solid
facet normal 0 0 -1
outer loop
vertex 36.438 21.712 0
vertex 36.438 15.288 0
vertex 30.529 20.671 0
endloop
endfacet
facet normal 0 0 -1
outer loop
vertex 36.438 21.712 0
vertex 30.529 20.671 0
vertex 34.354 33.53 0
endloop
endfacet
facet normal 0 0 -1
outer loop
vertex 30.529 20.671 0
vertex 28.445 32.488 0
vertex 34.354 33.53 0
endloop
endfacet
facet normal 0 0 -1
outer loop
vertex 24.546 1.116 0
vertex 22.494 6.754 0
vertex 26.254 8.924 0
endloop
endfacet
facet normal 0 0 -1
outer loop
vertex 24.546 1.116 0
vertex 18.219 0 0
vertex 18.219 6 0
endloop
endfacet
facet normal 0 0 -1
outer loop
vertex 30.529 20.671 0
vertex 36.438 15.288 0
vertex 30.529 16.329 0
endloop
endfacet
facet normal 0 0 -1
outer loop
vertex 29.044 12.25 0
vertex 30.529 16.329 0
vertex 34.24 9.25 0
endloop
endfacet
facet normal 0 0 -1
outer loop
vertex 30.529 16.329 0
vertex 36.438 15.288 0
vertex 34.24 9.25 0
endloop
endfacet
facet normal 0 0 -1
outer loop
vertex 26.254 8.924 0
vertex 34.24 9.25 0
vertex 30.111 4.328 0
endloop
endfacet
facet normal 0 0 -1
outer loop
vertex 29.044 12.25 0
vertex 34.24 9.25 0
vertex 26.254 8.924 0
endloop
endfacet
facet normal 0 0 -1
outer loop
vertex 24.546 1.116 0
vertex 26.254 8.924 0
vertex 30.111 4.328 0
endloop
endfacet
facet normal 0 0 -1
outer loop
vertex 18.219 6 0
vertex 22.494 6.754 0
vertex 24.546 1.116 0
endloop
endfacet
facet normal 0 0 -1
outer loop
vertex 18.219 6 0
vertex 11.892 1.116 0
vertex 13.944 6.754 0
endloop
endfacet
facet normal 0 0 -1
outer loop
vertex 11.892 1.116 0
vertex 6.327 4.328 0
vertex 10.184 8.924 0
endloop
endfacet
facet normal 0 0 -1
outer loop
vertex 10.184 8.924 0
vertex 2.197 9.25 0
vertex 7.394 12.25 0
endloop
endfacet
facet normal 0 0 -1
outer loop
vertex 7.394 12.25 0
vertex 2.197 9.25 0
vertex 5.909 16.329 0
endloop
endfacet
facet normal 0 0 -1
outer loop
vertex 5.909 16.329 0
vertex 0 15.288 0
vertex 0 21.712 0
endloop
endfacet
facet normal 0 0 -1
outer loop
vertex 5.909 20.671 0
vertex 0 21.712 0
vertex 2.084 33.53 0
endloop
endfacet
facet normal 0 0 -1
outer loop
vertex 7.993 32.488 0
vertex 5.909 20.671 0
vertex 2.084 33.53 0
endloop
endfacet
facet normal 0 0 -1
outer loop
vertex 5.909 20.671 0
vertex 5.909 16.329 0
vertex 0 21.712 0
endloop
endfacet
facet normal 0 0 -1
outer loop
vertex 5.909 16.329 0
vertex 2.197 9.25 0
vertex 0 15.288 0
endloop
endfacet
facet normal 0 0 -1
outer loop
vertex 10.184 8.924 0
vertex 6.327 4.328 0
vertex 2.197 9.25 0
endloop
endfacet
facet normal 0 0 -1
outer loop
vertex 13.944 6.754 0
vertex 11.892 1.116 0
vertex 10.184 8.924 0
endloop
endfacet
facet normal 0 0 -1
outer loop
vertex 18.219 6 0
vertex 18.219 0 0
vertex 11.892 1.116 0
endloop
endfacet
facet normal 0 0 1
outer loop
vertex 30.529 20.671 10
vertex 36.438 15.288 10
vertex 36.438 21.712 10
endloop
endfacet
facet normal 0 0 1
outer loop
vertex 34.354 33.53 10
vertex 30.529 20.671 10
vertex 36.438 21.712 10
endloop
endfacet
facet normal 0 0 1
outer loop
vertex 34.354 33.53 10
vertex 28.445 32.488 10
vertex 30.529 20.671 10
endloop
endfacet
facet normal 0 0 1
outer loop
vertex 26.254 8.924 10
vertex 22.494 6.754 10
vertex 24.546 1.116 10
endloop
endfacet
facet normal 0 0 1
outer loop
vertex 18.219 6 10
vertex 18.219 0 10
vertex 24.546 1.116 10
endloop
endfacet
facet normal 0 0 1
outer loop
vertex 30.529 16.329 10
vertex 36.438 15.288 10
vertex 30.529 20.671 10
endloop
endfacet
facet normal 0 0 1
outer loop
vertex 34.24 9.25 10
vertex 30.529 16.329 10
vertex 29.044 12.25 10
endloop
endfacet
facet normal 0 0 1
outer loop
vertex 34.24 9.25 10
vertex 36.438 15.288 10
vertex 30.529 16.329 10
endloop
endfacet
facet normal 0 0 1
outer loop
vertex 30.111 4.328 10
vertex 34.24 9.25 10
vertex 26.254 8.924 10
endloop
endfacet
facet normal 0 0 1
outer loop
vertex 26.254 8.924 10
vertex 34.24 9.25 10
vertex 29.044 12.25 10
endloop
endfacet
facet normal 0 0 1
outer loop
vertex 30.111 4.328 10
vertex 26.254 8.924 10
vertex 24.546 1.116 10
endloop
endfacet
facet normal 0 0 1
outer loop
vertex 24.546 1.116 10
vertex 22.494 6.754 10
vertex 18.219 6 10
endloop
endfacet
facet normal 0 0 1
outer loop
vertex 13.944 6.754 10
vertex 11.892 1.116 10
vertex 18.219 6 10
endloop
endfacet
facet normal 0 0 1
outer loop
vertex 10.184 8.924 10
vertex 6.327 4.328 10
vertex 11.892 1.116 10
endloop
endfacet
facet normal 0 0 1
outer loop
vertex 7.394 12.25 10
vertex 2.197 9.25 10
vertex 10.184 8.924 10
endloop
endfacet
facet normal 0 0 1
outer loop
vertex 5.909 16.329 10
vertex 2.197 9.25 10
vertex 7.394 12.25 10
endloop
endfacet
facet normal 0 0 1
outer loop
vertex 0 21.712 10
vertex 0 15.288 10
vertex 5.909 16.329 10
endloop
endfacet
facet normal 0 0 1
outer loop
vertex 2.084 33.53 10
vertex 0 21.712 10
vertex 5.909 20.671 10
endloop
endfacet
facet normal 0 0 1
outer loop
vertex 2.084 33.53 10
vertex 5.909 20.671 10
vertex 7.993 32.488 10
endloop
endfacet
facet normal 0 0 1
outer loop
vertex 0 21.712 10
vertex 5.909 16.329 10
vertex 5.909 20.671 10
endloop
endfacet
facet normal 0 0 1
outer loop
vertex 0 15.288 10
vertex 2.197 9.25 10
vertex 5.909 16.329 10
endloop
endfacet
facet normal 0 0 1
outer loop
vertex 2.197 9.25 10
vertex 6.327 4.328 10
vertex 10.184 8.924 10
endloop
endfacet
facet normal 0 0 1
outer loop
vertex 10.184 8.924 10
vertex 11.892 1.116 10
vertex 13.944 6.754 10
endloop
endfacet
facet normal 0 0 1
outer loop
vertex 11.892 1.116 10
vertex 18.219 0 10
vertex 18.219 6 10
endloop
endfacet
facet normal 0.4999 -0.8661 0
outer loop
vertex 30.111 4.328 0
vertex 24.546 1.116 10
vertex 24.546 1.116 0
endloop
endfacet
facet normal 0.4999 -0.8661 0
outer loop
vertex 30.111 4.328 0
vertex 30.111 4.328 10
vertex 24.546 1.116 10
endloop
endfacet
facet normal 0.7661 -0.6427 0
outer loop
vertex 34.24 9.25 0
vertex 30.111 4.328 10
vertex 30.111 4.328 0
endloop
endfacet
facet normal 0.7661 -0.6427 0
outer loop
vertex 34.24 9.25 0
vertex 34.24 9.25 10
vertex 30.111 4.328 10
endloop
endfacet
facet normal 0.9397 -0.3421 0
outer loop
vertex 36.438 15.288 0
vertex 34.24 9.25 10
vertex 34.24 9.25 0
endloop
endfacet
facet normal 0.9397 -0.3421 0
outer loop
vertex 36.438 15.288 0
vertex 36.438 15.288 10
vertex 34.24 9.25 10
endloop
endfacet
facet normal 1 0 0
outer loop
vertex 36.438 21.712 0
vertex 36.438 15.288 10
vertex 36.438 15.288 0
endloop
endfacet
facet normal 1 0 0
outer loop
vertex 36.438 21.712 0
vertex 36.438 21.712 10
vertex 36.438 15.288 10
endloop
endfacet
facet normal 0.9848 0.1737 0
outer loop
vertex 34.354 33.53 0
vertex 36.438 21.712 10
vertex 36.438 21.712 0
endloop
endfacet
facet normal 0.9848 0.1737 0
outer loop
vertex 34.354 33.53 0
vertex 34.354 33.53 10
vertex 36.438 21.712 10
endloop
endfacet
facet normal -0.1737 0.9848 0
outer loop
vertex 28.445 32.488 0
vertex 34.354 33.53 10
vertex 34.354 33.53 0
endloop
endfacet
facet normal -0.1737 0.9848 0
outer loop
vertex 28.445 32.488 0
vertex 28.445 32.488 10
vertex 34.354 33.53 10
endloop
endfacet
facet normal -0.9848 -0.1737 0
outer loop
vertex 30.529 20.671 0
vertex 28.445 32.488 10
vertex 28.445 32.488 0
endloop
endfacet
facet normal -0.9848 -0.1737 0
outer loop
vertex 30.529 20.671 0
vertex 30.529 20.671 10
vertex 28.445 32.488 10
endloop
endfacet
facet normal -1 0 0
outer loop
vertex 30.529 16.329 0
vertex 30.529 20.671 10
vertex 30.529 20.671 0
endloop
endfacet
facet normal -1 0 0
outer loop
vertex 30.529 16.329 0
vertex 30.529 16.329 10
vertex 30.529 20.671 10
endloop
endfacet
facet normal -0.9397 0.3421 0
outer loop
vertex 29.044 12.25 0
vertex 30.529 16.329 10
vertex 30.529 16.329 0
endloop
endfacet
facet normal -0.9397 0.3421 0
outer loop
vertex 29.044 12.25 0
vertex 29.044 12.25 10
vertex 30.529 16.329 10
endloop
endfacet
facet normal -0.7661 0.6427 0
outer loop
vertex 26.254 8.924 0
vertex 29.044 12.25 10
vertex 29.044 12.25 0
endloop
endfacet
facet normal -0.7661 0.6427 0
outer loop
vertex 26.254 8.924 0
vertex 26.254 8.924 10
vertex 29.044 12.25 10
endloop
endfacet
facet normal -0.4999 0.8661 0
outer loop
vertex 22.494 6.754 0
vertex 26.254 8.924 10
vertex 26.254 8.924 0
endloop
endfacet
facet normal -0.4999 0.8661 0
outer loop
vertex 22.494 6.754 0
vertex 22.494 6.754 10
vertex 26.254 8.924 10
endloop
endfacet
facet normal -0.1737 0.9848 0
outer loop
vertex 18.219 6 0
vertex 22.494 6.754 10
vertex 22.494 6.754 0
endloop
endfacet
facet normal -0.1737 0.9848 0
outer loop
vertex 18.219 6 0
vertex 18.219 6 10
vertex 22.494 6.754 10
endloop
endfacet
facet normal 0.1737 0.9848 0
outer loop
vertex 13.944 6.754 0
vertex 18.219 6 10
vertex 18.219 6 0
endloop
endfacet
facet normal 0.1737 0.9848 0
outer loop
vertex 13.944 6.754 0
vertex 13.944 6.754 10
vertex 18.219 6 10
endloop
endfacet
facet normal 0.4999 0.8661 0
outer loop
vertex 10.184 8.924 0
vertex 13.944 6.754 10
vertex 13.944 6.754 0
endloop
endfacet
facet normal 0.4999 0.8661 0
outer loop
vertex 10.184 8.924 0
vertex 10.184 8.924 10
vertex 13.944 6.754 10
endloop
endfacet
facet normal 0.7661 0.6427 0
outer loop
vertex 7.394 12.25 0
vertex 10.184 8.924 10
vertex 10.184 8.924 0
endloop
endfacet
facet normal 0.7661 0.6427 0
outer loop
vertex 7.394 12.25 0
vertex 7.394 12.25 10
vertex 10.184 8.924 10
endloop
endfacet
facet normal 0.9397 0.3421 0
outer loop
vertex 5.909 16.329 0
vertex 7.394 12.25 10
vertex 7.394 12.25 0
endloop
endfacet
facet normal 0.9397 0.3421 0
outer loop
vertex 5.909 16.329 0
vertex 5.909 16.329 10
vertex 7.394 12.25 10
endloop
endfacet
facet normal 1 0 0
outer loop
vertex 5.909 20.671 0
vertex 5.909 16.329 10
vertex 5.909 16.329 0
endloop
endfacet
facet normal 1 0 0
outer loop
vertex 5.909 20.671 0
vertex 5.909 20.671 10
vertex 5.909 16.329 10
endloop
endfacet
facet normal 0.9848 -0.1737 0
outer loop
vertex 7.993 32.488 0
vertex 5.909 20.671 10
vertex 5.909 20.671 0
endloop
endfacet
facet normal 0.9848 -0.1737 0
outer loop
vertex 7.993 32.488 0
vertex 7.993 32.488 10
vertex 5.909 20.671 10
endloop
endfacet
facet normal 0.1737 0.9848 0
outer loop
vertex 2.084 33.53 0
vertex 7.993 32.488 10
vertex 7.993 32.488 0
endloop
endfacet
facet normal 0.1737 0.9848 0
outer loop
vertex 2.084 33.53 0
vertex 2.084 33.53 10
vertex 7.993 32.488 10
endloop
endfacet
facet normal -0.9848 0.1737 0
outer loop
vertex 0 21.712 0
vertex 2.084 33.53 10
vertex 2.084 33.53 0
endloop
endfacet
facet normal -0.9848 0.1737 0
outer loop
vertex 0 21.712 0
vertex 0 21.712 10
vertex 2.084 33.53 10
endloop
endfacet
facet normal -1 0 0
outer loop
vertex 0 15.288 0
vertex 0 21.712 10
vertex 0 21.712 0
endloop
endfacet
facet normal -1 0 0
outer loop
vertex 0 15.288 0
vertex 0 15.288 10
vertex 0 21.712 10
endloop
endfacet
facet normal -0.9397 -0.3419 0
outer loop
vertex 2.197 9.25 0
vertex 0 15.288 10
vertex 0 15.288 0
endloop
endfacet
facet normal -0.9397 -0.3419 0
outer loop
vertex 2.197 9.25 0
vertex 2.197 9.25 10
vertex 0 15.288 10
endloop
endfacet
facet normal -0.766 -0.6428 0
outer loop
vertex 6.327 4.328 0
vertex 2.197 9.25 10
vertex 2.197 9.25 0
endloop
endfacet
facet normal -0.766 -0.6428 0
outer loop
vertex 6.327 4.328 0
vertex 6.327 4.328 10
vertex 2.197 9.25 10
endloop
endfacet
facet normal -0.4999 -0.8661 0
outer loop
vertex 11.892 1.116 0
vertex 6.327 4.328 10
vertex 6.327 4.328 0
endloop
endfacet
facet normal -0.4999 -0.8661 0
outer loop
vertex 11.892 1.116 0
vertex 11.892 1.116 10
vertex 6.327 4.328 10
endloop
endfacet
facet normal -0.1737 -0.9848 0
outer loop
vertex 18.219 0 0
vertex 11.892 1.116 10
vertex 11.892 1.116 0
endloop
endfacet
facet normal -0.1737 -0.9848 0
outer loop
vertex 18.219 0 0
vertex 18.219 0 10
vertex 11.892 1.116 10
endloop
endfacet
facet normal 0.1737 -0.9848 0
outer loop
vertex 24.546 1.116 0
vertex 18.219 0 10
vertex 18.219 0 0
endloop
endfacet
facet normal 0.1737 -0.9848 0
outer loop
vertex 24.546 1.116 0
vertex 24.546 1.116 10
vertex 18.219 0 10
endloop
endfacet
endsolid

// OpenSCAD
$fn = 32;

// ----------------------------------------------------------------------
// Clip blank: omega clip, 10 mm thick
// ----------------------------------------------------------------------

// --- parameters (mm) ---
profile_height = 10;      // extrusion height
profile_points = 26;      // points of the closed outline

profile = [[0, 21.712], [0, 15.288], [2.197, 9.25], [6.327, 4.328], [11.892, 1.116], [18.219, 0], [24.546, 1.116], [30.111, 4.328], [34.24, 9.25], [36.438, 15.288], [36.438, 21.712], [34.354, 33.53], [28.445, 32.488], [30.529, 20.671], [30.529, 16.329], [29.044, 12.25], [26.254, 8.924], [22.494, 6.754], [18.219, 6], [13.944, 6.754], [10.184, 8.924], [7.394, 12.25], [5.909, 16.329], [5.909, 20.671], [7.993, 32.488], [2.084, 33.53]];  // single closed polygon, 26 points, counter clockwise

// --- the one profile operation ---
linear_extrude(height = profile_height) polygon(points = profile);
